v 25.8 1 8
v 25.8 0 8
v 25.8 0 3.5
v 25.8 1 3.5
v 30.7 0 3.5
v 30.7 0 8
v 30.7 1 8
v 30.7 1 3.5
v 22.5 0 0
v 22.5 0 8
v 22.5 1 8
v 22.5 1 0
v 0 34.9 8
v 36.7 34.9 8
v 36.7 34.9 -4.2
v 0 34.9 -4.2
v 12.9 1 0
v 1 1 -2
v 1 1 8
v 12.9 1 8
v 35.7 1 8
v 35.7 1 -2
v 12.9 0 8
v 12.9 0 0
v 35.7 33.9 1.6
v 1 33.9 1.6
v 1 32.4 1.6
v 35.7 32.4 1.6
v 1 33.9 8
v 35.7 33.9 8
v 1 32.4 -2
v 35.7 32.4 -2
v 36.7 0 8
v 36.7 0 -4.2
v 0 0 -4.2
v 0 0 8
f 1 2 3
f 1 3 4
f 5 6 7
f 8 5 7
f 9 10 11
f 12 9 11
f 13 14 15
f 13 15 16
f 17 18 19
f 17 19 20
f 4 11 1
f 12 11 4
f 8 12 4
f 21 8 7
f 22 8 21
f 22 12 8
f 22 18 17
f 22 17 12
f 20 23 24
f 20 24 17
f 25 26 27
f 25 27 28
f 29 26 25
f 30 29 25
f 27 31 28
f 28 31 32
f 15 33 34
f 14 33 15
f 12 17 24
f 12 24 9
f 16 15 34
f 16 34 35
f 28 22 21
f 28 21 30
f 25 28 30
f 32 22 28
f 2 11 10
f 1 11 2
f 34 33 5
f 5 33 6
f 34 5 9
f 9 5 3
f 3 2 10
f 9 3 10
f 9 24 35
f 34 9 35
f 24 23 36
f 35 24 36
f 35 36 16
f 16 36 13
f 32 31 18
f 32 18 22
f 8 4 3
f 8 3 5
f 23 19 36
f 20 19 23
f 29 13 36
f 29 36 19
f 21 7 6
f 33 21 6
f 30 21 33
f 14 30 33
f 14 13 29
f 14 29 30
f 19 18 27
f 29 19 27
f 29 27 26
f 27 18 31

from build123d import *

# Parameters (mm, degrees)
SKETCH1_W           = 36.7
SKETCH1_H           = 34.9
SKETCH1_W_2         = 34.7
SKETCH1_H_2         = 32.9
BOSS_EXTRUDE1_DEPTH = 8
SKETCH2_W           = 36.7
SKETCH2_H           = 34.9
BOSS_EXTRUDE2_DEPTH = 4.2
SKETCH3_W           = 4.9
SKETCH3_H           = 1
CUT_EXTRUDE1_DEPTH  = 4.5
SKETCH4_W           = 9.6
SKETCH4_H           = 1
CUT_EXTRUDE2_DEPTH  = 8
SKETCH5_W           = 34.7
SKETCH5_H           = 1.5
BOSS_EXTRUDE3_DEPTH = 1.6
SKETCH6_W           = 34.7
SKETCH6_H           = 31.4
CUT_EXTRUDE3_DEPTH  = 2


with BuildPart() as part:
    # Sketch1 → Boss-Extrude1 (new body)
    with BuildSketch(Plane.XY):
        with Locations((18.35, 17.45)):
            Rectangle(SKETCH1_W, SKETCH1_H)
        with Locations((18.35, 17.45)):
            Rectangle(SKETCH1_W_2, SKETCH1_H_2, mode=Mode.SUBTRACT)
    extrude(amount=BOSS_EXTRUDE1_DEPTH)

    # Sketch2 → Boss-Extrude2 (add)
    with BuildSketch(Plane(origin=(0, 0, 0), x_dir=(-1, 0, 0), z_dir=(0, 0, -1))):
        with Locations((-18.35, 17.45)):
            Rectangle(SKETCH2_W, SKETCH2_H)
    extrude(amount=BOSS_EXTRUDE2_DEPTH)

    # Sketch3 → Cut-Extrude1 (cut)
    with BuildSketch(Plane.XY.offset(8)):
        with Locations((28.25, 0.5)):
            Rectangle(SKETCH3_W, SKETCH3_H)
    extrude(amount=-CUT_EXTRUDE1_DEPTH, mode=Mode.SUBTRACT)

    # Sketch4 → Cut-Extrude2 (cut)
    with BuildSketch(Plane.XY.offset(8)):
        with Locations((17.7, 0.5)):
            Rectangle(SKETCH4_W, SKETCH4_H)
    extrude(amount=-CUT_EXTRUDE2_DEPTH, mode=Mode.SUBTRACT)

    # Sketch5 → Boss-Extrude3 (add)
    with BuildSketch(Plane.XY):
        with Locations((18.35, 33.15)):
            Rectangle(SKETCH5_W, SKETCH5_H)
    extrude(amount=BOSS_EXTRUDE3_DEPTH)

    # Sketch6 → Cut-Extrude3 (cut)
    with BuildSketch(Plane.XY):
        with Locations((18.35, 16.7)):
            Rectangle(SKETCH6_W, SKETCH6_H)
    extrude(amount=-CUT_EXTRUDE3_DEPTH, mode=Mode.SUBTRACT)


solid = part.part
